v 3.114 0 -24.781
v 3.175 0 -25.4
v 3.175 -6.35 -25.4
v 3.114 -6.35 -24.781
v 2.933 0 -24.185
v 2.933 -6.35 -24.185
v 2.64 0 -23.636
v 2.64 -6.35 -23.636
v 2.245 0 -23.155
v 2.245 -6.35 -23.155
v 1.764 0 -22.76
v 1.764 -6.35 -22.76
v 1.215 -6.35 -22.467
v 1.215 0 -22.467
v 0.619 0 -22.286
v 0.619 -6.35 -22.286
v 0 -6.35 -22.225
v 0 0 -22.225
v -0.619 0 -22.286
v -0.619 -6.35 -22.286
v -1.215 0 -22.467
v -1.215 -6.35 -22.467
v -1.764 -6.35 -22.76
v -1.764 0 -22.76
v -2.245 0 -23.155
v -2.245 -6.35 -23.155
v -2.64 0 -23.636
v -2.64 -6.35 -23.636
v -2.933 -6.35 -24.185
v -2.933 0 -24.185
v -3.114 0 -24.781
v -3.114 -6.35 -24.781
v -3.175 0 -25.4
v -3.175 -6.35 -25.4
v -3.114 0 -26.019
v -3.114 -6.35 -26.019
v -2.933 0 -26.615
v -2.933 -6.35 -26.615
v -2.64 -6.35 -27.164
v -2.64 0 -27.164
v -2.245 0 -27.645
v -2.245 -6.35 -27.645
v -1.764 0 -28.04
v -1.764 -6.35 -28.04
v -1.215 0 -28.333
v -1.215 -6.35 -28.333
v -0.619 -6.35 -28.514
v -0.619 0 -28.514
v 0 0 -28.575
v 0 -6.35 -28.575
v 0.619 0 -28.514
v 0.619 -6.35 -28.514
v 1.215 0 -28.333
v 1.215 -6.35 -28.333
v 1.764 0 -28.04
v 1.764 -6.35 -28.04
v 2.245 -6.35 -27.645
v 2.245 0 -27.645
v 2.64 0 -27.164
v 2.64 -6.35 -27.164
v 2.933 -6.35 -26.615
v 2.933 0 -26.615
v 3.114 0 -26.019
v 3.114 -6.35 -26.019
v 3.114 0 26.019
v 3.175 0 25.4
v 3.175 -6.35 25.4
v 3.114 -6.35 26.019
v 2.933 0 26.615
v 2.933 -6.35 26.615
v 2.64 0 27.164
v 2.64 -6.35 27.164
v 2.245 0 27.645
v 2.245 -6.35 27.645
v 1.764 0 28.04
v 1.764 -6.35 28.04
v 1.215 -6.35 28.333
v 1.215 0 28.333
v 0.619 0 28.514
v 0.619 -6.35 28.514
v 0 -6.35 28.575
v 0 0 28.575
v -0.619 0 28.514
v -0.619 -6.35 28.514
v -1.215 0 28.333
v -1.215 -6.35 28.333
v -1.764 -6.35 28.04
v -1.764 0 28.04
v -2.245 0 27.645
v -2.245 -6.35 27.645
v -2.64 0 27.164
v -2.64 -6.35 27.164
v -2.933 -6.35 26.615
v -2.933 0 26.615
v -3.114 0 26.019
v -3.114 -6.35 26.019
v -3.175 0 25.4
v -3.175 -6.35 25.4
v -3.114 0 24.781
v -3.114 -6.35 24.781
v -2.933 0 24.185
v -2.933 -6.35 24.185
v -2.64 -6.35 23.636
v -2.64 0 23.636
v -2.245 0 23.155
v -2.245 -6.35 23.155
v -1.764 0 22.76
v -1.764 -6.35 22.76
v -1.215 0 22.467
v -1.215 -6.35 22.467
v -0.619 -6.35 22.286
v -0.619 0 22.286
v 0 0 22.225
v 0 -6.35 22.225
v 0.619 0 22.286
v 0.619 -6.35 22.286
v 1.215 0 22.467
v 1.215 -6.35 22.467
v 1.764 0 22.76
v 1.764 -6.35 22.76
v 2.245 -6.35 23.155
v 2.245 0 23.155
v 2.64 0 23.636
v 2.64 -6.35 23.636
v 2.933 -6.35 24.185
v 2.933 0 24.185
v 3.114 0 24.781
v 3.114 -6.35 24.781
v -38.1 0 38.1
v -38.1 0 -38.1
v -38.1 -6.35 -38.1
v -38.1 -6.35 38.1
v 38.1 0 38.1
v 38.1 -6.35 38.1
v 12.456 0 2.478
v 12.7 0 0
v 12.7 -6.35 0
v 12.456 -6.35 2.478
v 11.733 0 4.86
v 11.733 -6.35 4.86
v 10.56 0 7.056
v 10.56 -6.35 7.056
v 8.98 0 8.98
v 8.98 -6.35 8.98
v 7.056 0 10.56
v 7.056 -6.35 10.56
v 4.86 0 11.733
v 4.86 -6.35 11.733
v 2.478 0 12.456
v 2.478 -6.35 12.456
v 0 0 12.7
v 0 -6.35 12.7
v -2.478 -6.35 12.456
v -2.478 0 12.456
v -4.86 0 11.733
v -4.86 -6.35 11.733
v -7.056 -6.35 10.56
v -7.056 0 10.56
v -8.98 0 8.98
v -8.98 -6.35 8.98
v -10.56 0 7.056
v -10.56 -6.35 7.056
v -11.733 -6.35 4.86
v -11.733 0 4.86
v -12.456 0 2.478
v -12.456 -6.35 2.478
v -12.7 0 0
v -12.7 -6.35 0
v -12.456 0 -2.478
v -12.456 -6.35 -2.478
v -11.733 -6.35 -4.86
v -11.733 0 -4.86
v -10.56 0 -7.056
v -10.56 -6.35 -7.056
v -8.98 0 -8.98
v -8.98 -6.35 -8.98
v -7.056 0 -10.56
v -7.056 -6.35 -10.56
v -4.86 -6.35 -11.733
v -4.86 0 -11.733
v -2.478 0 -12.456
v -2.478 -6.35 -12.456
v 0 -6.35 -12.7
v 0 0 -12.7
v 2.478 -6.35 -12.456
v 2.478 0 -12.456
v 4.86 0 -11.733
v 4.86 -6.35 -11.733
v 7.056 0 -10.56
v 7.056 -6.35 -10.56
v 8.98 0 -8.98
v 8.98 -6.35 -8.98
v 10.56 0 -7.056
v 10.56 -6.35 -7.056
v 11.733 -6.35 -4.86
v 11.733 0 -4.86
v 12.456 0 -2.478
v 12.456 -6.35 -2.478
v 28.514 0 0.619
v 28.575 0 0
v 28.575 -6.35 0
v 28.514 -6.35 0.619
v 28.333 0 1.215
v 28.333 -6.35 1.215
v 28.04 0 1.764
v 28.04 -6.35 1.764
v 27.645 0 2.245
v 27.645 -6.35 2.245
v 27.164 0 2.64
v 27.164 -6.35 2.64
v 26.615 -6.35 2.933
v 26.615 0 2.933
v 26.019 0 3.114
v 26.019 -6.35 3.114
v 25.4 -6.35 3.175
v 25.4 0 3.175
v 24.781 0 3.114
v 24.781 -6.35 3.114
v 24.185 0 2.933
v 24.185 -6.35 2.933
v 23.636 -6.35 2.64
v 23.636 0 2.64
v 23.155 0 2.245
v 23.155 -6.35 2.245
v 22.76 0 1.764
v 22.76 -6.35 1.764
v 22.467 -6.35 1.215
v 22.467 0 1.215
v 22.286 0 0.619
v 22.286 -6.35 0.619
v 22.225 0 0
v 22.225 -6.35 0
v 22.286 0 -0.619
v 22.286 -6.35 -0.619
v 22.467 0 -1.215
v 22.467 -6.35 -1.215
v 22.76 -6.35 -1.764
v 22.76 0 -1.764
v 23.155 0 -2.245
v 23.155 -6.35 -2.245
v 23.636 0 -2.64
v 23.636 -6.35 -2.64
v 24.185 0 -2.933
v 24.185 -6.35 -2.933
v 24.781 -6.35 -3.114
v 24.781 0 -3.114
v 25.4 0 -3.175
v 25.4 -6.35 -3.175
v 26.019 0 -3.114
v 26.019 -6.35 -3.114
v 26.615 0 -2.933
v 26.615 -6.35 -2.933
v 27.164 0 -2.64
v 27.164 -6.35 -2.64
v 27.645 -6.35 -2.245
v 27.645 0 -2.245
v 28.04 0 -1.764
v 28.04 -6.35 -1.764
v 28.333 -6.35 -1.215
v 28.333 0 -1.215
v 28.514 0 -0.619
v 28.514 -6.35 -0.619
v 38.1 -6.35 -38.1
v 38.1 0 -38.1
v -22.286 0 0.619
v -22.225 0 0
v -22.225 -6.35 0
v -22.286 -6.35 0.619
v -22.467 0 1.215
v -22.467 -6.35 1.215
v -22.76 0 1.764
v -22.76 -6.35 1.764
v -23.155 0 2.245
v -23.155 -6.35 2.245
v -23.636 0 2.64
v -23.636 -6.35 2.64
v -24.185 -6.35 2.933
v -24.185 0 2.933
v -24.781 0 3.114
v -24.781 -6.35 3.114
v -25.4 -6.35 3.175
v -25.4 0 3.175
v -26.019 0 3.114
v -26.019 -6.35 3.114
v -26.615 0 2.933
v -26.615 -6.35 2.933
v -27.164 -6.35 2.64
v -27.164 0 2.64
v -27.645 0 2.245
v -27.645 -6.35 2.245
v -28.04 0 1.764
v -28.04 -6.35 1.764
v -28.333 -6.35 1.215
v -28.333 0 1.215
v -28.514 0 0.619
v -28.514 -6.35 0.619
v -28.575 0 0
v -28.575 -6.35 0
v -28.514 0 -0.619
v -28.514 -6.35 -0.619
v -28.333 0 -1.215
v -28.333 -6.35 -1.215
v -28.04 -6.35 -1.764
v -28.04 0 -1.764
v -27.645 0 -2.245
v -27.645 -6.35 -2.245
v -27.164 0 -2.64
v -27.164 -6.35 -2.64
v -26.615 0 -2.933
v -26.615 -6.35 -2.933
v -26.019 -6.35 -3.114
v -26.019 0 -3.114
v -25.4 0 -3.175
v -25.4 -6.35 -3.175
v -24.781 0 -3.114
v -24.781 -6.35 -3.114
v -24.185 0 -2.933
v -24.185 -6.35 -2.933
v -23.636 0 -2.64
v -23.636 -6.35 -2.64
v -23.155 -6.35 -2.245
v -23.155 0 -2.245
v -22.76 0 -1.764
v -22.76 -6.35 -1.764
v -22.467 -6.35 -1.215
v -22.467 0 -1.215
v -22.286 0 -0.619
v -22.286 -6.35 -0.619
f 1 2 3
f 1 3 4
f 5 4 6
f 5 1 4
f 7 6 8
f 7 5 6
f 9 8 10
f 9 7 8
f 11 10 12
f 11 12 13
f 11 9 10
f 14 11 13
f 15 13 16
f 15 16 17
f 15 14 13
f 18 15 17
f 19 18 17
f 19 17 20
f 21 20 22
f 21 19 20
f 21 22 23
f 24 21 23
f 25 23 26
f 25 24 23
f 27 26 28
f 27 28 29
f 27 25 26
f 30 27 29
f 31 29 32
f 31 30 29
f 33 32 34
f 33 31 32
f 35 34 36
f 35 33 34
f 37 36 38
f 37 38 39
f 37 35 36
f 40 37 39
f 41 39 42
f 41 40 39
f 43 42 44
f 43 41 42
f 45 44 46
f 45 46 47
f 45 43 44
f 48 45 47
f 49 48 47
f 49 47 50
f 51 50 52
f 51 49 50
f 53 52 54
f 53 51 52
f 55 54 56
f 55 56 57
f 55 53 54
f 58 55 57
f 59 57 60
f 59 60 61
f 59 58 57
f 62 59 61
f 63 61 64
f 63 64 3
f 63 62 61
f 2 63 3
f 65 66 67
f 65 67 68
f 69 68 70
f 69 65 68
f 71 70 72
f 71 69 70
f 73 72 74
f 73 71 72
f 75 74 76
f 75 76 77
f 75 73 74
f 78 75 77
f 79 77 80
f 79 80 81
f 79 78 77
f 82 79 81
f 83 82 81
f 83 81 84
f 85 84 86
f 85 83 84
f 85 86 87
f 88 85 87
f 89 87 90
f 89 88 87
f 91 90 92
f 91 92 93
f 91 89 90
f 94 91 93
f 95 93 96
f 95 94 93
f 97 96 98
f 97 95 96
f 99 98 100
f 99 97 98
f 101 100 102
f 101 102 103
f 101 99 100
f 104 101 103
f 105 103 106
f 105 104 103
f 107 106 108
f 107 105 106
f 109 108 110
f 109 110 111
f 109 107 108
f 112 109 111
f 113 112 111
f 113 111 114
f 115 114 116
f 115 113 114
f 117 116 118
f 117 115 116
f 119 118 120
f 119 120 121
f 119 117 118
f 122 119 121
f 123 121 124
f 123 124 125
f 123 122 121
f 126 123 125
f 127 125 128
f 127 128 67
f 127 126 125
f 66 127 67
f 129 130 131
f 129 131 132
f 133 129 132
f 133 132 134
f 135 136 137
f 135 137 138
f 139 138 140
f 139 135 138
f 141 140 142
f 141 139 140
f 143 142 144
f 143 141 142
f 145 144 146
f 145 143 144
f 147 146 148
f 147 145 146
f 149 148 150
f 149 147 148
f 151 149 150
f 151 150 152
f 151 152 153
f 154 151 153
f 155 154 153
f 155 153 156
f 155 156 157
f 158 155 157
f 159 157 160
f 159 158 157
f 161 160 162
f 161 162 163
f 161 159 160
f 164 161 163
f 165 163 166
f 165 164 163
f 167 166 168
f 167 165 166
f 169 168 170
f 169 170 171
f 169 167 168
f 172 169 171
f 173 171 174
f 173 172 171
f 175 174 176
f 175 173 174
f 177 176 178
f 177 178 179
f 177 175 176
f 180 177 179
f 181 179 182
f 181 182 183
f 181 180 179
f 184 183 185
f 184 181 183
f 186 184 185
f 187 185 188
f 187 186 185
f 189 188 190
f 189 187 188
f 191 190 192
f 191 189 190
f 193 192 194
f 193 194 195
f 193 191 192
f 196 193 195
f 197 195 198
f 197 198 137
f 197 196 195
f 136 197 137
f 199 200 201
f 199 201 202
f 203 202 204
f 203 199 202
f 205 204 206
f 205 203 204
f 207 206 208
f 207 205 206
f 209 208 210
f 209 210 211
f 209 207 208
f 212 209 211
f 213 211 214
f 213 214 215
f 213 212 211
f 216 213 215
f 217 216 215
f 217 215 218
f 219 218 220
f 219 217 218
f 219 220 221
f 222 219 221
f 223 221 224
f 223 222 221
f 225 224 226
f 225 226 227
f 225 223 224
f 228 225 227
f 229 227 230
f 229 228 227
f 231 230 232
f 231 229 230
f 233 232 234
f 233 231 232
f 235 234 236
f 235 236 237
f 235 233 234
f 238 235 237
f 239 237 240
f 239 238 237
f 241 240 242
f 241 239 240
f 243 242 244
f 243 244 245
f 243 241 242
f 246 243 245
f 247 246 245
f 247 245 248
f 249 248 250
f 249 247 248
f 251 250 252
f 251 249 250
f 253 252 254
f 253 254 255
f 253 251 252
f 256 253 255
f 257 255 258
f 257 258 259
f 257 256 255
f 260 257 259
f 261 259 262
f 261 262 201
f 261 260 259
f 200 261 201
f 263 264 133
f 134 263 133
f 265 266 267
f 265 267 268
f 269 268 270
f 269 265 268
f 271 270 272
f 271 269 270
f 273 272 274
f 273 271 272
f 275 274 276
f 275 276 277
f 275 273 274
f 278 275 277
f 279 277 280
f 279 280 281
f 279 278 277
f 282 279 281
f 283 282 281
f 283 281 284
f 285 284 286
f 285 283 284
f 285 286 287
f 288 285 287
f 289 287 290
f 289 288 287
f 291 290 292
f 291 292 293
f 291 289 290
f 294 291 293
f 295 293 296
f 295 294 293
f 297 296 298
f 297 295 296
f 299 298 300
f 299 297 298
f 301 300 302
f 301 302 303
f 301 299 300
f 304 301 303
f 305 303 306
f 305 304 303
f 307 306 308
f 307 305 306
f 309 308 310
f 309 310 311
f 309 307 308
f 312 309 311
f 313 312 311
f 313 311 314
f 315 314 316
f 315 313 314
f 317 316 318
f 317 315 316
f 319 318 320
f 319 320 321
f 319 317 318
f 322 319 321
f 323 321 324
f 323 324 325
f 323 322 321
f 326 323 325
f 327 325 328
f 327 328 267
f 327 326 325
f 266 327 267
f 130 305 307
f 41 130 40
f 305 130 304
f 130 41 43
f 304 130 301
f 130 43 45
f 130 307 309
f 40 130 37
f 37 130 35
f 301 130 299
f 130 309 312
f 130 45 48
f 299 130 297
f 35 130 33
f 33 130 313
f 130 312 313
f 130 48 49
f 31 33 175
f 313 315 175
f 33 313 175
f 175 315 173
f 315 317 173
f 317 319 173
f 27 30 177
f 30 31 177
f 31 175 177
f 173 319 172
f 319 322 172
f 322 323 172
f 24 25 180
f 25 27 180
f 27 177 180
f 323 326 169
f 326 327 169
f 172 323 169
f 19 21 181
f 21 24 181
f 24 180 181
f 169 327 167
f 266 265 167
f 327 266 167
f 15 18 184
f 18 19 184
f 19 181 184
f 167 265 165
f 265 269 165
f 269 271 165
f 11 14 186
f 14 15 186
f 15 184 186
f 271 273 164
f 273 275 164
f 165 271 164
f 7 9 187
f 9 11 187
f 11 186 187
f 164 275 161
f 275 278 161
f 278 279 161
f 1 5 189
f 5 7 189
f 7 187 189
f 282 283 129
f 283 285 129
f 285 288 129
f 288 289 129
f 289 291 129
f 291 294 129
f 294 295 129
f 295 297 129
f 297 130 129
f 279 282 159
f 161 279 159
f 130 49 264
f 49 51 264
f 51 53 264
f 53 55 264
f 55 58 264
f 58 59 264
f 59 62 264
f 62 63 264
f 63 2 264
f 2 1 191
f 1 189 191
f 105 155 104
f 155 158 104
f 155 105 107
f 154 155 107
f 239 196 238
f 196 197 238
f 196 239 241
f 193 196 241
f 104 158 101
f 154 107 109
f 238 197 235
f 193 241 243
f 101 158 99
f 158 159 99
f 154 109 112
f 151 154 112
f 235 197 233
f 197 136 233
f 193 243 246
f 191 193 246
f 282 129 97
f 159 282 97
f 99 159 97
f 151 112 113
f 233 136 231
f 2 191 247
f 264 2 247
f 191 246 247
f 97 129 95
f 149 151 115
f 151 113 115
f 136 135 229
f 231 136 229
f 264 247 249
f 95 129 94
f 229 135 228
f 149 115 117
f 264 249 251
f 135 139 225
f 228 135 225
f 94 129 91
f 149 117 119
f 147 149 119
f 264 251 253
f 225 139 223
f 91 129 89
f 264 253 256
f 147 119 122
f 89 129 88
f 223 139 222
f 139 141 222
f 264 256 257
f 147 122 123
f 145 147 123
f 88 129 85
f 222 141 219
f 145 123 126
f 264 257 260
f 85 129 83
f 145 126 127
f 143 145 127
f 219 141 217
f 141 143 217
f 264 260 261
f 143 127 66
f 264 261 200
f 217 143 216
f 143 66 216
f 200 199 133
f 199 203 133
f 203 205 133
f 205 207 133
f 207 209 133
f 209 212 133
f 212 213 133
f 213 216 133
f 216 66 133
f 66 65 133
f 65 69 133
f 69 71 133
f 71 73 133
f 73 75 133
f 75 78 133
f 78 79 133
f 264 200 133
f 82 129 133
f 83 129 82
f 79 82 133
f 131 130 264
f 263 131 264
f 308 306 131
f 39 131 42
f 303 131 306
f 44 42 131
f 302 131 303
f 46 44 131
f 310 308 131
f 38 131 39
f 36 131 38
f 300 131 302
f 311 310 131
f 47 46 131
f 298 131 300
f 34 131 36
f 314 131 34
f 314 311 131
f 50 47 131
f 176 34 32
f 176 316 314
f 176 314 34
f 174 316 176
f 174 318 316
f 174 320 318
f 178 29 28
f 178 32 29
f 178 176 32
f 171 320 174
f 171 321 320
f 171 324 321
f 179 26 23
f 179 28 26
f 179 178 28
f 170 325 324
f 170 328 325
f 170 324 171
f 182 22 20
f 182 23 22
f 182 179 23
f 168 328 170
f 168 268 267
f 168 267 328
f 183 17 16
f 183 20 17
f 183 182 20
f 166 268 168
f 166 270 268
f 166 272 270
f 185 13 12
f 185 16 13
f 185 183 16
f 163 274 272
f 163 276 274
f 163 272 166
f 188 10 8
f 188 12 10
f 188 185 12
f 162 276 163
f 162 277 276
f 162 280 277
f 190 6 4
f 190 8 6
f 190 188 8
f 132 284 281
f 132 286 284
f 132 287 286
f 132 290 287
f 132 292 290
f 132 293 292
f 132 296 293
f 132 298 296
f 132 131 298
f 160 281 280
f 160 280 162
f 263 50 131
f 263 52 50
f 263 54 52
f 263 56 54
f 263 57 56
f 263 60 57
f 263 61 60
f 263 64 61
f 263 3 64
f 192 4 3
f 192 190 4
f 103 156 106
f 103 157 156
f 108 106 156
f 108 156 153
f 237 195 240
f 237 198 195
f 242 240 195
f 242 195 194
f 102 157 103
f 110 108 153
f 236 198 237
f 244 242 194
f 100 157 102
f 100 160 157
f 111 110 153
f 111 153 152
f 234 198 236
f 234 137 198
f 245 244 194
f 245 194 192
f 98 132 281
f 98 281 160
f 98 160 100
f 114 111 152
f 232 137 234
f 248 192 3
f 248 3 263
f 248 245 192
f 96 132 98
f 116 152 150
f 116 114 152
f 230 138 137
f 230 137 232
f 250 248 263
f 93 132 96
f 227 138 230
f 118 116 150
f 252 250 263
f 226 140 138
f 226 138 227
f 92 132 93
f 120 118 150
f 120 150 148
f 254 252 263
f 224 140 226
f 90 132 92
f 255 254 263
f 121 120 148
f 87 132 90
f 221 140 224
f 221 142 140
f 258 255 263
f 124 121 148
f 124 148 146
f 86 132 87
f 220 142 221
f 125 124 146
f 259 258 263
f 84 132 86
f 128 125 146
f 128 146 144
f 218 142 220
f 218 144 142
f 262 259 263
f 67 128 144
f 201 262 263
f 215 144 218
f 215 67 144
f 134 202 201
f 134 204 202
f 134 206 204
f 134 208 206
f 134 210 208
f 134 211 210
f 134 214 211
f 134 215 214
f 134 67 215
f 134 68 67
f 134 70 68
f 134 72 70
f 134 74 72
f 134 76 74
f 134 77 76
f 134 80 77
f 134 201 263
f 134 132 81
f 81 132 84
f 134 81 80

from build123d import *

# Parameters (mm, degrees)
F0_W     = 76.2
F0_H     = 76.2
F0_R     = 3.175
F0_R_2   = 12.7
F1_DEPTH = 6.35


with BuildPart() as f1:
    # F0 (on Front) → F1 (new body)
    with BuildSketch(Plane.XZ):
        Rectangle(F0_W, F0_H)
        with Locations((0, -25.4)):
            Circle(F0_R, mode=Mode.SUBTRACT)
        with Locations((-25.4, 0)):
            Circle(F0_R, mode=Mode.SUBTRACT)
        Circle(F0_R_2, mode=Mode.SUBTRACT)
        with Locations((25.4, 0)):
            Circle(F0_R, mode=Mode.SUBTRACT)
        with Locations((0, 25.4)):
            Circle(F0_R, mode=Mode.SUBTRACT)
    extrude(amount=F1_DEPTH)


solid = f1.part
